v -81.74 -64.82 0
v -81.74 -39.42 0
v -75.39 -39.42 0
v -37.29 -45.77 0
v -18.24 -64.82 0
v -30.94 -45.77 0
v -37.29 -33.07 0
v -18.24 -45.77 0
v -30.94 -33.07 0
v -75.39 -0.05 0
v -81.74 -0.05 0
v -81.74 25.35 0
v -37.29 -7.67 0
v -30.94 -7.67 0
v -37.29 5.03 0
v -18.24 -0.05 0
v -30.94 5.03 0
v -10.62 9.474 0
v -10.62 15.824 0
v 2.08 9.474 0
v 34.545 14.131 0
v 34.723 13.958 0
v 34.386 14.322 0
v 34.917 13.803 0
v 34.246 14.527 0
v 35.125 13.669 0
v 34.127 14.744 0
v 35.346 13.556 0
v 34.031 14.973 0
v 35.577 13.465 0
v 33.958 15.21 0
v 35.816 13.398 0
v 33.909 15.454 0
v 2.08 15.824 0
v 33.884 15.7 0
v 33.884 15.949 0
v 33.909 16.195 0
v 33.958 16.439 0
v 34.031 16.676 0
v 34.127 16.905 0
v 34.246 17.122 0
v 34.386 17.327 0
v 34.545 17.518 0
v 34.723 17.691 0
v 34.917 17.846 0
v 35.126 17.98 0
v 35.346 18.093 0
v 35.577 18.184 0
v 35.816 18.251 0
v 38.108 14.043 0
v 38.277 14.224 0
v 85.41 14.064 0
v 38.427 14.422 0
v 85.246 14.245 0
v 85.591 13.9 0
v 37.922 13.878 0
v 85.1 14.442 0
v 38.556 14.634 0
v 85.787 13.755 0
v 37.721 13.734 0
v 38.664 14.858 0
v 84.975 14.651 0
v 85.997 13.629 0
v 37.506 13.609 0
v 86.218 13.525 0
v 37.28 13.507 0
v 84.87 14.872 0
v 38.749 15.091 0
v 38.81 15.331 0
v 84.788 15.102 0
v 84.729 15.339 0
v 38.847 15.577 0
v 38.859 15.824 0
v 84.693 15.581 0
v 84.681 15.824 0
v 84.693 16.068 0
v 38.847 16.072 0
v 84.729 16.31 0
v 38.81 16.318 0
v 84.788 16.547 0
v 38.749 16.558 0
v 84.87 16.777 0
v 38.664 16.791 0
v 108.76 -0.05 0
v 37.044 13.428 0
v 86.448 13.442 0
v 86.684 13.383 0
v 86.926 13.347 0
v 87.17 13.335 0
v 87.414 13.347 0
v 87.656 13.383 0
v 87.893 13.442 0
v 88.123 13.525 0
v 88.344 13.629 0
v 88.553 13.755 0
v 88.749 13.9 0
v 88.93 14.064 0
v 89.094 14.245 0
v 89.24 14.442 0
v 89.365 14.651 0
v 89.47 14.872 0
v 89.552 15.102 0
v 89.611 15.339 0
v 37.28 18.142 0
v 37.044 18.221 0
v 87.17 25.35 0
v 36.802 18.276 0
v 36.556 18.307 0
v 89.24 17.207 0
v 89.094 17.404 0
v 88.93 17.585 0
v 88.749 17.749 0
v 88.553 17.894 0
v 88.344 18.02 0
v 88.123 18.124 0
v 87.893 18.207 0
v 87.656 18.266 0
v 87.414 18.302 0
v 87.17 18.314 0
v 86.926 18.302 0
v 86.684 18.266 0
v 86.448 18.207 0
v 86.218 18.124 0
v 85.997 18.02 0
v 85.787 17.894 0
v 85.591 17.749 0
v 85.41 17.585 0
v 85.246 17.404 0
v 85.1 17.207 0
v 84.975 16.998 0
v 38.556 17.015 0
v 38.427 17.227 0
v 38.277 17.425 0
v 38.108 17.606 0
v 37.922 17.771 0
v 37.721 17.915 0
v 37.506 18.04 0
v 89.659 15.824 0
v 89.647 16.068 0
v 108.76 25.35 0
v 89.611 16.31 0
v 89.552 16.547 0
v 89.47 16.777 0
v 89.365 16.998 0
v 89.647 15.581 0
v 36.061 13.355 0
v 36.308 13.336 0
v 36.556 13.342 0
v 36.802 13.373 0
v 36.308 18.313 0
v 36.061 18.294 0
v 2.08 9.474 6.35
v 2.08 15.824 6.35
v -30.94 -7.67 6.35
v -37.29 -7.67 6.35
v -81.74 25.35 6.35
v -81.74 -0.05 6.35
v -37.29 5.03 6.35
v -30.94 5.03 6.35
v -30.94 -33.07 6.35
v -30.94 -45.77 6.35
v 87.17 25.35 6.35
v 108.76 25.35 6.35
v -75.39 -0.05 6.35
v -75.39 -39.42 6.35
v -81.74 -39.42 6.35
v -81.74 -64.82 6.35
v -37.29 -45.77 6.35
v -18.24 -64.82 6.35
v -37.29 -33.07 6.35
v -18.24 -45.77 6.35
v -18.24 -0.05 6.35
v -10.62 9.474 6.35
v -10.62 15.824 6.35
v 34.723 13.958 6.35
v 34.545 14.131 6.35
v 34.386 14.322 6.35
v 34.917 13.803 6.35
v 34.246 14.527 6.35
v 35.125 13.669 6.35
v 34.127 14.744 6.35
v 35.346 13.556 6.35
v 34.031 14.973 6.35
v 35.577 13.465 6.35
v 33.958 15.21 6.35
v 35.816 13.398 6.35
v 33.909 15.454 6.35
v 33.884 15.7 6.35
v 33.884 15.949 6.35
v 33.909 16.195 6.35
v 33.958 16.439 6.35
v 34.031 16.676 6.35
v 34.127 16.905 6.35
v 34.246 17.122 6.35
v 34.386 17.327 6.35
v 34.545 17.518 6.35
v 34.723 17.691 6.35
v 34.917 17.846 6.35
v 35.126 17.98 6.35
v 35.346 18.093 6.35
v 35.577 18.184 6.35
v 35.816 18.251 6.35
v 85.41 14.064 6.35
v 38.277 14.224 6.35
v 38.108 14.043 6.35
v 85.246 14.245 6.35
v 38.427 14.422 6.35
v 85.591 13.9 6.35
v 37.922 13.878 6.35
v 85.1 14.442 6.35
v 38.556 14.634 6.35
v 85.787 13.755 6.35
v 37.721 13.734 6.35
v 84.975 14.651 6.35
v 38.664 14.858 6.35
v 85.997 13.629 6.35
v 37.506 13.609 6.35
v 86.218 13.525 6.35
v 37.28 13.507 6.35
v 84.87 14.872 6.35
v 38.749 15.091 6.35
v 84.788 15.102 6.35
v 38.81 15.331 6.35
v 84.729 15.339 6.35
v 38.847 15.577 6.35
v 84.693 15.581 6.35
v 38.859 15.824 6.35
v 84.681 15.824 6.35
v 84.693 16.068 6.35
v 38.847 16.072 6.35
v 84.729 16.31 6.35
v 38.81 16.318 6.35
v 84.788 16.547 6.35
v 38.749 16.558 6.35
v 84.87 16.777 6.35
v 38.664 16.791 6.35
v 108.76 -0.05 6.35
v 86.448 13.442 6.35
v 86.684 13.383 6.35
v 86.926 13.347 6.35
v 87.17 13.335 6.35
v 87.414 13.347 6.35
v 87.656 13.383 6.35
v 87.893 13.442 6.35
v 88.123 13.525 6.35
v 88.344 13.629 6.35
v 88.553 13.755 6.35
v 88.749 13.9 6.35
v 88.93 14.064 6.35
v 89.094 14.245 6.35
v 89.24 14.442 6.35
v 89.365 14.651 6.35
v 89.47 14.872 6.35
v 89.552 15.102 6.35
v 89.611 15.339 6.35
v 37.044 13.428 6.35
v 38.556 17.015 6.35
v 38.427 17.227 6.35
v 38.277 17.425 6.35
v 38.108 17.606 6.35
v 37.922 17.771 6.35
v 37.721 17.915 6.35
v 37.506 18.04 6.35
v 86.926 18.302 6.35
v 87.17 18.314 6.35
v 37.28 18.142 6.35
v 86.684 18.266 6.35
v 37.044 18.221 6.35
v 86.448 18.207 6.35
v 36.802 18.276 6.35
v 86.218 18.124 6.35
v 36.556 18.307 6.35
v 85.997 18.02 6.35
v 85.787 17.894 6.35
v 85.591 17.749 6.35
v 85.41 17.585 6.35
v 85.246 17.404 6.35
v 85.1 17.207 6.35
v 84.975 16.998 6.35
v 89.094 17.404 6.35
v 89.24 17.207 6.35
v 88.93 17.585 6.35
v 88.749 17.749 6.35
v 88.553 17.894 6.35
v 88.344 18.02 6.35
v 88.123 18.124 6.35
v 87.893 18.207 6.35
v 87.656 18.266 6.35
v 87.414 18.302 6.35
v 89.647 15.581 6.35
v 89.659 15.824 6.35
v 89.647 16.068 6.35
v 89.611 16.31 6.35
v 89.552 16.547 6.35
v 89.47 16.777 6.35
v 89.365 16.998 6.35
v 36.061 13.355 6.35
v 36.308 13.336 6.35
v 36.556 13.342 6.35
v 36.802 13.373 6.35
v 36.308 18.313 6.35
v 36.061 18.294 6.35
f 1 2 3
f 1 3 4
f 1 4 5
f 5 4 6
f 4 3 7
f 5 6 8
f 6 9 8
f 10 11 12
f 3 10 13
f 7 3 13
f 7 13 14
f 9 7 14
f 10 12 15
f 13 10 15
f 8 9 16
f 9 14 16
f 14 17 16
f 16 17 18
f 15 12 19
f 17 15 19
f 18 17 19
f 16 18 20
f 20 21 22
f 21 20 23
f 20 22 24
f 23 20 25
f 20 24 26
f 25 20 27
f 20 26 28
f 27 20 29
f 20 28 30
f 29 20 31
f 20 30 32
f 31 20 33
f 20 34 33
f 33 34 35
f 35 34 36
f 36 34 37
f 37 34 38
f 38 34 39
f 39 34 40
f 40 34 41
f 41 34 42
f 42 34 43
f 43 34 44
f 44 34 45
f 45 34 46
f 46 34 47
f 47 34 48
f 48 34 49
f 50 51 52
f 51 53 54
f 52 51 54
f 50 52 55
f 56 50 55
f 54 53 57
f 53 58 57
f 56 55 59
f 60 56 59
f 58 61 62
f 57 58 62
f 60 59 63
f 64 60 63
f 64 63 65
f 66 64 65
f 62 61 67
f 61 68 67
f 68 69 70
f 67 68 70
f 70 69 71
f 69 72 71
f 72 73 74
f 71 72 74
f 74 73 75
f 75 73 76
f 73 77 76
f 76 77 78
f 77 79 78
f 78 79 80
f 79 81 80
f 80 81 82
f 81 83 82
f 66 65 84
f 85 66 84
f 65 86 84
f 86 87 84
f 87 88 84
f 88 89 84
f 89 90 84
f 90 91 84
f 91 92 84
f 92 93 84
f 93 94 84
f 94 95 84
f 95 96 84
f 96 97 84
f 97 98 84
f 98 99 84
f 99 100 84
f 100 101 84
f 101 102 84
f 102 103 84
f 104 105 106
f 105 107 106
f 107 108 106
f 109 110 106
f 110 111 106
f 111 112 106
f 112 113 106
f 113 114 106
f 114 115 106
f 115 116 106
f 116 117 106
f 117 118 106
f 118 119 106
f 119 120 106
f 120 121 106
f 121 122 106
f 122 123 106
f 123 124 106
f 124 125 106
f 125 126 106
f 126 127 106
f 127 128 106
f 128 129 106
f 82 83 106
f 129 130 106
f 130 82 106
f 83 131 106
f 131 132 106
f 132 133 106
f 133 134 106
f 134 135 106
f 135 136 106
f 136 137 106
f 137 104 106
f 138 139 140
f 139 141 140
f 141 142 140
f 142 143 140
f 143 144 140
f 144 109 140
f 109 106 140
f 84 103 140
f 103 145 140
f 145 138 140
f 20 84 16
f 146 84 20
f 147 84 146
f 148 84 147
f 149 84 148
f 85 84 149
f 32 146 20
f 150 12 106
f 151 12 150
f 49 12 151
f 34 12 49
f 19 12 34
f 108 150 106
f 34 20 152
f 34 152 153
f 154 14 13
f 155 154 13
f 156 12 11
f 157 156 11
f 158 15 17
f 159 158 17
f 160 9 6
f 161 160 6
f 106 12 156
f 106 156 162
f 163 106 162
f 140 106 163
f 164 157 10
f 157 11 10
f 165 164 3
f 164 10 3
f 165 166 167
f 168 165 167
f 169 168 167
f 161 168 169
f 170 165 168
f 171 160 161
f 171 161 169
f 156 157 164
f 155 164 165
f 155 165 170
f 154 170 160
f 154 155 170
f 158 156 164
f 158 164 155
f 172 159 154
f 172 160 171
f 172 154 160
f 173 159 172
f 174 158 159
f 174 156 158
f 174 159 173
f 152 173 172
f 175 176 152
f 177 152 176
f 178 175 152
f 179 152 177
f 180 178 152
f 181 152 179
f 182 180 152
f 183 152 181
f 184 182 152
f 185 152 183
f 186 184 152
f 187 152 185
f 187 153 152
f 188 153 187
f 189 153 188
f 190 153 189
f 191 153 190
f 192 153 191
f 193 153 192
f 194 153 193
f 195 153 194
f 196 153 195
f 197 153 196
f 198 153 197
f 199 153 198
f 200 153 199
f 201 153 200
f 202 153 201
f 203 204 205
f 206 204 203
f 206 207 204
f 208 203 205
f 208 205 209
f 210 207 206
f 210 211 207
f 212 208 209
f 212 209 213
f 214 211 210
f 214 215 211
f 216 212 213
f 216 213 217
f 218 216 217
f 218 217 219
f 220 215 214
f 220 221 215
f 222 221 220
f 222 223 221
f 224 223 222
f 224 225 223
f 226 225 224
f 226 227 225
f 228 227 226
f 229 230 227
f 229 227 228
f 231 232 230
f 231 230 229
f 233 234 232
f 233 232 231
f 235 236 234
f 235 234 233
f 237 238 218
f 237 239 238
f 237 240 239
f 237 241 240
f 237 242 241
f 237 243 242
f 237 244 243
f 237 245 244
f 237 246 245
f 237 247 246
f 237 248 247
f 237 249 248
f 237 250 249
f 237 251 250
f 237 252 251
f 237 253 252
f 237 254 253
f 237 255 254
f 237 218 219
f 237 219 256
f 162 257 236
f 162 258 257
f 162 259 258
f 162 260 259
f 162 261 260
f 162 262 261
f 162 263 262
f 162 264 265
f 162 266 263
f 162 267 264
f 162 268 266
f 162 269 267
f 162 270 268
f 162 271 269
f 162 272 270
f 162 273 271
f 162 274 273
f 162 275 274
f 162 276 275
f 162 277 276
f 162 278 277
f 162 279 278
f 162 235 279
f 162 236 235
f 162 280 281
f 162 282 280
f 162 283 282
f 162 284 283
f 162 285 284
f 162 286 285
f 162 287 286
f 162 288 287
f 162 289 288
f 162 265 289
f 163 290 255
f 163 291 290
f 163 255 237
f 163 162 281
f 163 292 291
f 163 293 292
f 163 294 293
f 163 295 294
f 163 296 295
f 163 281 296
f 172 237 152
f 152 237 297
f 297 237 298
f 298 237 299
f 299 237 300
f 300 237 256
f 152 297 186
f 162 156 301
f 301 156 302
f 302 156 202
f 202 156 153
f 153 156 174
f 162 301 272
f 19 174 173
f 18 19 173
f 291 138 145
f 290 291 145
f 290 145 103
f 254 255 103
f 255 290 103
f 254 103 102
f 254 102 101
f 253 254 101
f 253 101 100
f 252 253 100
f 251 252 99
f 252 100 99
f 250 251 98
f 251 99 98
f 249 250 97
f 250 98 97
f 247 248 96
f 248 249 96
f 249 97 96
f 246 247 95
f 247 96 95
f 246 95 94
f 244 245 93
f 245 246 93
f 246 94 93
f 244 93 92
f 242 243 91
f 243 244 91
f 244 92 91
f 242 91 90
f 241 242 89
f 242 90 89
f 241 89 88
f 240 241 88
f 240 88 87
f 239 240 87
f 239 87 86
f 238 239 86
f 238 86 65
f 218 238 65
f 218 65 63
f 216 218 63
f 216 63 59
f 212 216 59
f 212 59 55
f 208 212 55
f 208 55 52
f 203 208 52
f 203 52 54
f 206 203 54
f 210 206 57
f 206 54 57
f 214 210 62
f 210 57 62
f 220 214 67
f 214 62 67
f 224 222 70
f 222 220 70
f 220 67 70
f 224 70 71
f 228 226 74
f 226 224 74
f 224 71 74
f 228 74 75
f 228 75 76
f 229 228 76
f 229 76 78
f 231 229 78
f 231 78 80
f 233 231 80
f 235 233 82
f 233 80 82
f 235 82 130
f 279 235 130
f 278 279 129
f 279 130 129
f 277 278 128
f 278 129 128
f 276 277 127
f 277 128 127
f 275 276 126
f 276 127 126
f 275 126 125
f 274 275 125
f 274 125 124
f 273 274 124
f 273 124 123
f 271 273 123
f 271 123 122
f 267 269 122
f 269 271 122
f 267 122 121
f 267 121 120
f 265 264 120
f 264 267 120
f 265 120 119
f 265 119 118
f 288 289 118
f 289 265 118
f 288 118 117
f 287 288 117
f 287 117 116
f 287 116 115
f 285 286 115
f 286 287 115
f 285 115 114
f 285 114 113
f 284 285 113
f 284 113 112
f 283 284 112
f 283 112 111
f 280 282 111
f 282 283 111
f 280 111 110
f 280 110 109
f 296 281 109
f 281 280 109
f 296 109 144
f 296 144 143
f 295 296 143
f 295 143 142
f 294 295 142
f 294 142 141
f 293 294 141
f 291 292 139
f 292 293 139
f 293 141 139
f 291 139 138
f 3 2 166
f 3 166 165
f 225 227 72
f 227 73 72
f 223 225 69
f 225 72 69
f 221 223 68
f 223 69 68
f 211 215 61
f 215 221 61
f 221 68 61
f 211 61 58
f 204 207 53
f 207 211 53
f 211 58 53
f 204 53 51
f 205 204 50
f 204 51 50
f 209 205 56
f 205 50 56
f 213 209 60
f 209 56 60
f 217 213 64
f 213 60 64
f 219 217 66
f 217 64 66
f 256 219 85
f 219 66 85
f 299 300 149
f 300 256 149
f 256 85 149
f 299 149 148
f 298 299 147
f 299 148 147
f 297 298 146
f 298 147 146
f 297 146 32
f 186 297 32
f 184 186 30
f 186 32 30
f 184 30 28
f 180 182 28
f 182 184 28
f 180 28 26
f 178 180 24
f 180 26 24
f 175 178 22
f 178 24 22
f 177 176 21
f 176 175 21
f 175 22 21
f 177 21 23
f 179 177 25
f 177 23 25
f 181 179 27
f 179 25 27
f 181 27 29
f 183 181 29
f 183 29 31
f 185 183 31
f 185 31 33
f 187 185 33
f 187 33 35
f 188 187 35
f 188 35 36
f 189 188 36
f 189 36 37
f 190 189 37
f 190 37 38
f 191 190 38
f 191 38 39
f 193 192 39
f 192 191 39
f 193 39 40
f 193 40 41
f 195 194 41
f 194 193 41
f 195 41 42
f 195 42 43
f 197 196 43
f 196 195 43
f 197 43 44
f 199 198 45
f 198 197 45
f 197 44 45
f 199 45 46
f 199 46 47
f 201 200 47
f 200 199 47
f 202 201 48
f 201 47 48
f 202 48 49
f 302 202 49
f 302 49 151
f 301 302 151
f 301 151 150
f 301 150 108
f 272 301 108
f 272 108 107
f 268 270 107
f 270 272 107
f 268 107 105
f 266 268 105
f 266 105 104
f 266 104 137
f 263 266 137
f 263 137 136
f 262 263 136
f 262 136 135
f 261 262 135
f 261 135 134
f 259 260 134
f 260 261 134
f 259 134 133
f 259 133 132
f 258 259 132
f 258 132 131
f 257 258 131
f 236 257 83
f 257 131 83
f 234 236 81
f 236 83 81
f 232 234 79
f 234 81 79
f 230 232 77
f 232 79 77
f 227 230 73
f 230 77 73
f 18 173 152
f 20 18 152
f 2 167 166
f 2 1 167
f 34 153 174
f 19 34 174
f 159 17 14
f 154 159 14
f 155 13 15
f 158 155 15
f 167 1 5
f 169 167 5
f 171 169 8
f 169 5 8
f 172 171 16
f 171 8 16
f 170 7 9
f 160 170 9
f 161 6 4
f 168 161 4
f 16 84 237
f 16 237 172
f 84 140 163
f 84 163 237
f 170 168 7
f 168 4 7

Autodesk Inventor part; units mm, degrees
ref_plane "YZ Plane" through (0, 0, 0) normal (1, 0, 0) x (0, 1, 0)
ref_plane "XZ Plane" through (0, 0, 0) normal (0, 1, 0) x (-1, 0, 0)
ref_plane "XY Plane" through (0, 0, 0) normal (0, 0, 1) x (1, 0, 0)
sketch "Sketch2" plane through (0, 0, 0) normal (0, 0, 1) x (1, 0, 0)
  line L0 (-75.3899, 25.3495) -> (108.7601, 25.3495)
  line L1 (108.7601, 25.3495) -> (108.7601, -0.0505)
  line L2 (108.7601, -0.0505) -> (-18.2399, -0.0505)
  line L3 (-75.3899, 25.3495) -> (-75.3899, -64.8205)
  line L4 (-75.3899, -64.8205) -> (-18.2399, -64.8205)
  line L5 (-18.2399, -64.8205) -> (-18.2399, -0.0505)
  line L6 (-75.3899, 25.3495) -> (-81.7399, 25.3495)
  line L7 (-81.7399, 25.3495) -> (-81.7399, -0.0505)
  line L8 (-81.7399, -0.0505) -> (-75.3899, -0.0505)
  line L9 (-75.3899, -64.8205) -> (-81.7399, -64.8205)
  line L10 (-81.7399, -64.8205) -> (-81.7399, -39.4205)
  line L11 (-81.7399, -39.4205) -> (-75.3899, -39.4205)
  line L12 (108.7601, 25.3495) -> (87.1701, 25.3495)
  line L13 (87.1701, 25.3495) -> (87.1701, 15.8245)
  line L14 (87.1701, 15.8245) -> (36.3701, 15.8245)
  circle A0 centre (36.3701, 15.8245) radius 2.4892
  circle A1 centre (87.1701, 15.8245) radius 2.4892
  line L15 (-18.2399, -64.8205) -> (-18.2399, -45.7705)
  line L16 (-18.2399, -45.7705) -> (-37.2899, -45.7705)
  line L17 (-37.2899, -45.7705) -> (-37.2899, -33.0705)
  line L18 (-37.2899, -33.0705) -> (-30.9399, -33.0705)
  line L19 (-30.9399, -33.0705) -> (-30.9399, -7.6705)
  line L20 (-30.9399, -7.6705) -> (-37.2899, -7.6705)
  line L21 (-37.2899, -7.6705) -> (-37.2899, 5.0295)
  line L22 (-37.2899, 5.0295) -> (-30.9399, 5.0295)
  line L23 (-30.9399, 5.0295) -> (-30.9399, -7.6705)
  line L24 (-30.9399, -33.0705) -> (-30.9399, -45.7705)
  point P0 (0, 0)
  dimension "d5" = 184.15
  dimension "d6" = 25.4
  dimension "d7" = 127
  dimension "d8" = 90.17
  dimension "d9" = 6.35
  dimension "d10" = 25.4
  dimension "d11" = 25.4
  dimension "d12" = 21.59
  dimension "d13" = 9.525
  dimension "d14" = 50.8
  dimension "d15" = 4.9784
  dimension "d16" = 4.9784
  dimension "d17" = 19.05
  dimension "d18" = 19.05
  dimension "d19" = 12.7
  dimension "d20" = 6.35
  dimension "d21" = 25.4
  dimension "d22" = 6.35
  dimension "d23" = 12.7
extrude "Extrusion1" add sketch "Sketch2" along normal blind 6.35
sketch "Sketch3" plane through (0, 0, 6.35) normal (0, 0, 1) x (1, 0, 0)
  line L0 (-81.7399, 25.3495) -> (108.7601, 25.3495) projected
  line L1 (108.7601, 25.3495) -> (2.0801, 25.3495)
  line L2 (2.0801, 25.3495) -> (2.0801, 15.8245)
  line L3 (2.0801, 15.8245) -> (-10.6199, 15.8245)
  line L4 (-10.6199, 15.8245) -> (-10.6199, 9.4745)
  line L5 (-10.6199, 9.4745) -> (2.0801, 9.4745)
  line L6 (2.0801, 9.4745) -> (2.0801, 15.8245)
  point P0 (0, 0)
  dimension "d26" = 106.68
  dimension "d27" = 9.525
  dimension "d28" = 12.7
  dimension "d29" = 6.35
extrude "Extrusion2" cut sketch "Sketch3" against normal blind 25.4
properties part number "side 1"
